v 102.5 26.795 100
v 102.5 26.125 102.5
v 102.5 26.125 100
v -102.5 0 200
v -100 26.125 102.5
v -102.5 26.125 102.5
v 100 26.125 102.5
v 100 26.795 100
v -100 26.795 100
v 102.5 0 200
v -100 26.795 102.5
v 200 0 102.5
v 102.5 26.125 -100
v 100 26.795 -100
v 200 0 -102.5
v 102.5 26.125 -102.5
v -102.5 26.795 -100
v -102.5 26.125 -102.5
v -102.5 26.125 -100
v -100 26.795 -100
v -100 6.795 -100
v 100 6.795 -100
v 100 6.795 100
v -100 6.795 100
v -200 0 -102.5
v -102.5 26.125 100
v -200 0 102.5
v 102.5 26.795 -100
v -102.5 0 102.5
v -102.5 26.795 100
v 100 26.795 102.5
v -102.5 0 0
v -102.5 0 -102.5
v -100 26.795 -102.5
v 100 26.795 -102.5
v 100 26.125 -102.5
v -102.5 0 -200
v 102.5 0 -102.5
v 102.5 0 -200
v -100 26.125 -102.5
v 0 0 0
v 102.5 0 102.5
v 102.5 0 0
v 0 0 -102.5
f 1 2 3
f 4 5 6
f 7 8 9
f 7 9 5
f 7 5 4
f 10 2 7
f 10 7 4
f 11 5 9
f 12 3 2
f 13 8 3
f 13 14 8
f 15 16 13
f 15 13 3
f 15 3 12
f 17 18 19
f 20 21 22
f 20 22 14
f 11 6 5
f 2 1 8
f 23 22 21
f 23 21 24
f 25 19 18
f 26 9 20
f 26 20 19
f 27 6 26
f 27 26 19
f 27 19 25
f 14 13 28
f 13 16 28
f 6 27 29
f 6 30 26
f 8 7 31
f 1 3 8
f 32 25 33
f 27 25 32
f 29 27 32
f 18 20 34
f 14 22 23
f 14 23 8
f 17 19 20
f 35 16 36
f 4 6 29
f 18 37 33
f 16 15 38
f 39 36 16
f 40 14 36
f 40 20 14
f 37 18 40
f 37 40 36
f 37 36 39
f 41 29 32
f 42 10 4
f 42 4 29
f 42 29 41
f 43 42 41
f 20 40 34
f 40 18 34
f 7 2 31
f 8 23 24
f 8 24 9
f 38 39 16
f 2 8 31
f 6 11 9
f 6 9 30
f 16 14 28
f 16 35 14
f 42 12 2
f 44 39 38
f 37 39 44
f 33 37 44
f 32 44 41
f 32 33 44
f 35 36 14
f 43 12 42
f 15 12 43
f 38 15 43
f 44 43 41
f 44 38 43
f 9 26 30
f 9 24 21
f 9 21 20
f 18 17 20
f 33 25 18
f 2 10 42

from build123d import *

# Parameters (mm, degrees)
BOSS_EXTRUDE1_DEPTH = 102.5
CIRPATTERN1_COUNT   = 4


with BuildPart() as part:
    # Sketch1 → Boss-Extrude1 (new, symmetric)
    with BuildSketch(Plane(origin=(0, 0, 0), x_dir=(0, 0, -1), z_dir=(1, 0, 0))):
        Polygon((0, 0), (0, 6.794919243), (-100, 6.794919243), (-100, 26.794919243), (-200, 0), align=None)
    boss_extrude1 = extrude(amount=BOSS_EXTRUDE1_DEPTH, both=True)

    # CirPattern1: Boss-Extrude1 ×4 about axis
    cirpattern1_axis = Axis((0, 28.134665205, 0), (0, -1, 0))
    for i in range(1, CIRPATTERN1_COUNT):
        add(boss_extrude1.rotate(cirpattern1_axis, i * 360 / CIRPATTERN1_COUNT))


solid = part.part
